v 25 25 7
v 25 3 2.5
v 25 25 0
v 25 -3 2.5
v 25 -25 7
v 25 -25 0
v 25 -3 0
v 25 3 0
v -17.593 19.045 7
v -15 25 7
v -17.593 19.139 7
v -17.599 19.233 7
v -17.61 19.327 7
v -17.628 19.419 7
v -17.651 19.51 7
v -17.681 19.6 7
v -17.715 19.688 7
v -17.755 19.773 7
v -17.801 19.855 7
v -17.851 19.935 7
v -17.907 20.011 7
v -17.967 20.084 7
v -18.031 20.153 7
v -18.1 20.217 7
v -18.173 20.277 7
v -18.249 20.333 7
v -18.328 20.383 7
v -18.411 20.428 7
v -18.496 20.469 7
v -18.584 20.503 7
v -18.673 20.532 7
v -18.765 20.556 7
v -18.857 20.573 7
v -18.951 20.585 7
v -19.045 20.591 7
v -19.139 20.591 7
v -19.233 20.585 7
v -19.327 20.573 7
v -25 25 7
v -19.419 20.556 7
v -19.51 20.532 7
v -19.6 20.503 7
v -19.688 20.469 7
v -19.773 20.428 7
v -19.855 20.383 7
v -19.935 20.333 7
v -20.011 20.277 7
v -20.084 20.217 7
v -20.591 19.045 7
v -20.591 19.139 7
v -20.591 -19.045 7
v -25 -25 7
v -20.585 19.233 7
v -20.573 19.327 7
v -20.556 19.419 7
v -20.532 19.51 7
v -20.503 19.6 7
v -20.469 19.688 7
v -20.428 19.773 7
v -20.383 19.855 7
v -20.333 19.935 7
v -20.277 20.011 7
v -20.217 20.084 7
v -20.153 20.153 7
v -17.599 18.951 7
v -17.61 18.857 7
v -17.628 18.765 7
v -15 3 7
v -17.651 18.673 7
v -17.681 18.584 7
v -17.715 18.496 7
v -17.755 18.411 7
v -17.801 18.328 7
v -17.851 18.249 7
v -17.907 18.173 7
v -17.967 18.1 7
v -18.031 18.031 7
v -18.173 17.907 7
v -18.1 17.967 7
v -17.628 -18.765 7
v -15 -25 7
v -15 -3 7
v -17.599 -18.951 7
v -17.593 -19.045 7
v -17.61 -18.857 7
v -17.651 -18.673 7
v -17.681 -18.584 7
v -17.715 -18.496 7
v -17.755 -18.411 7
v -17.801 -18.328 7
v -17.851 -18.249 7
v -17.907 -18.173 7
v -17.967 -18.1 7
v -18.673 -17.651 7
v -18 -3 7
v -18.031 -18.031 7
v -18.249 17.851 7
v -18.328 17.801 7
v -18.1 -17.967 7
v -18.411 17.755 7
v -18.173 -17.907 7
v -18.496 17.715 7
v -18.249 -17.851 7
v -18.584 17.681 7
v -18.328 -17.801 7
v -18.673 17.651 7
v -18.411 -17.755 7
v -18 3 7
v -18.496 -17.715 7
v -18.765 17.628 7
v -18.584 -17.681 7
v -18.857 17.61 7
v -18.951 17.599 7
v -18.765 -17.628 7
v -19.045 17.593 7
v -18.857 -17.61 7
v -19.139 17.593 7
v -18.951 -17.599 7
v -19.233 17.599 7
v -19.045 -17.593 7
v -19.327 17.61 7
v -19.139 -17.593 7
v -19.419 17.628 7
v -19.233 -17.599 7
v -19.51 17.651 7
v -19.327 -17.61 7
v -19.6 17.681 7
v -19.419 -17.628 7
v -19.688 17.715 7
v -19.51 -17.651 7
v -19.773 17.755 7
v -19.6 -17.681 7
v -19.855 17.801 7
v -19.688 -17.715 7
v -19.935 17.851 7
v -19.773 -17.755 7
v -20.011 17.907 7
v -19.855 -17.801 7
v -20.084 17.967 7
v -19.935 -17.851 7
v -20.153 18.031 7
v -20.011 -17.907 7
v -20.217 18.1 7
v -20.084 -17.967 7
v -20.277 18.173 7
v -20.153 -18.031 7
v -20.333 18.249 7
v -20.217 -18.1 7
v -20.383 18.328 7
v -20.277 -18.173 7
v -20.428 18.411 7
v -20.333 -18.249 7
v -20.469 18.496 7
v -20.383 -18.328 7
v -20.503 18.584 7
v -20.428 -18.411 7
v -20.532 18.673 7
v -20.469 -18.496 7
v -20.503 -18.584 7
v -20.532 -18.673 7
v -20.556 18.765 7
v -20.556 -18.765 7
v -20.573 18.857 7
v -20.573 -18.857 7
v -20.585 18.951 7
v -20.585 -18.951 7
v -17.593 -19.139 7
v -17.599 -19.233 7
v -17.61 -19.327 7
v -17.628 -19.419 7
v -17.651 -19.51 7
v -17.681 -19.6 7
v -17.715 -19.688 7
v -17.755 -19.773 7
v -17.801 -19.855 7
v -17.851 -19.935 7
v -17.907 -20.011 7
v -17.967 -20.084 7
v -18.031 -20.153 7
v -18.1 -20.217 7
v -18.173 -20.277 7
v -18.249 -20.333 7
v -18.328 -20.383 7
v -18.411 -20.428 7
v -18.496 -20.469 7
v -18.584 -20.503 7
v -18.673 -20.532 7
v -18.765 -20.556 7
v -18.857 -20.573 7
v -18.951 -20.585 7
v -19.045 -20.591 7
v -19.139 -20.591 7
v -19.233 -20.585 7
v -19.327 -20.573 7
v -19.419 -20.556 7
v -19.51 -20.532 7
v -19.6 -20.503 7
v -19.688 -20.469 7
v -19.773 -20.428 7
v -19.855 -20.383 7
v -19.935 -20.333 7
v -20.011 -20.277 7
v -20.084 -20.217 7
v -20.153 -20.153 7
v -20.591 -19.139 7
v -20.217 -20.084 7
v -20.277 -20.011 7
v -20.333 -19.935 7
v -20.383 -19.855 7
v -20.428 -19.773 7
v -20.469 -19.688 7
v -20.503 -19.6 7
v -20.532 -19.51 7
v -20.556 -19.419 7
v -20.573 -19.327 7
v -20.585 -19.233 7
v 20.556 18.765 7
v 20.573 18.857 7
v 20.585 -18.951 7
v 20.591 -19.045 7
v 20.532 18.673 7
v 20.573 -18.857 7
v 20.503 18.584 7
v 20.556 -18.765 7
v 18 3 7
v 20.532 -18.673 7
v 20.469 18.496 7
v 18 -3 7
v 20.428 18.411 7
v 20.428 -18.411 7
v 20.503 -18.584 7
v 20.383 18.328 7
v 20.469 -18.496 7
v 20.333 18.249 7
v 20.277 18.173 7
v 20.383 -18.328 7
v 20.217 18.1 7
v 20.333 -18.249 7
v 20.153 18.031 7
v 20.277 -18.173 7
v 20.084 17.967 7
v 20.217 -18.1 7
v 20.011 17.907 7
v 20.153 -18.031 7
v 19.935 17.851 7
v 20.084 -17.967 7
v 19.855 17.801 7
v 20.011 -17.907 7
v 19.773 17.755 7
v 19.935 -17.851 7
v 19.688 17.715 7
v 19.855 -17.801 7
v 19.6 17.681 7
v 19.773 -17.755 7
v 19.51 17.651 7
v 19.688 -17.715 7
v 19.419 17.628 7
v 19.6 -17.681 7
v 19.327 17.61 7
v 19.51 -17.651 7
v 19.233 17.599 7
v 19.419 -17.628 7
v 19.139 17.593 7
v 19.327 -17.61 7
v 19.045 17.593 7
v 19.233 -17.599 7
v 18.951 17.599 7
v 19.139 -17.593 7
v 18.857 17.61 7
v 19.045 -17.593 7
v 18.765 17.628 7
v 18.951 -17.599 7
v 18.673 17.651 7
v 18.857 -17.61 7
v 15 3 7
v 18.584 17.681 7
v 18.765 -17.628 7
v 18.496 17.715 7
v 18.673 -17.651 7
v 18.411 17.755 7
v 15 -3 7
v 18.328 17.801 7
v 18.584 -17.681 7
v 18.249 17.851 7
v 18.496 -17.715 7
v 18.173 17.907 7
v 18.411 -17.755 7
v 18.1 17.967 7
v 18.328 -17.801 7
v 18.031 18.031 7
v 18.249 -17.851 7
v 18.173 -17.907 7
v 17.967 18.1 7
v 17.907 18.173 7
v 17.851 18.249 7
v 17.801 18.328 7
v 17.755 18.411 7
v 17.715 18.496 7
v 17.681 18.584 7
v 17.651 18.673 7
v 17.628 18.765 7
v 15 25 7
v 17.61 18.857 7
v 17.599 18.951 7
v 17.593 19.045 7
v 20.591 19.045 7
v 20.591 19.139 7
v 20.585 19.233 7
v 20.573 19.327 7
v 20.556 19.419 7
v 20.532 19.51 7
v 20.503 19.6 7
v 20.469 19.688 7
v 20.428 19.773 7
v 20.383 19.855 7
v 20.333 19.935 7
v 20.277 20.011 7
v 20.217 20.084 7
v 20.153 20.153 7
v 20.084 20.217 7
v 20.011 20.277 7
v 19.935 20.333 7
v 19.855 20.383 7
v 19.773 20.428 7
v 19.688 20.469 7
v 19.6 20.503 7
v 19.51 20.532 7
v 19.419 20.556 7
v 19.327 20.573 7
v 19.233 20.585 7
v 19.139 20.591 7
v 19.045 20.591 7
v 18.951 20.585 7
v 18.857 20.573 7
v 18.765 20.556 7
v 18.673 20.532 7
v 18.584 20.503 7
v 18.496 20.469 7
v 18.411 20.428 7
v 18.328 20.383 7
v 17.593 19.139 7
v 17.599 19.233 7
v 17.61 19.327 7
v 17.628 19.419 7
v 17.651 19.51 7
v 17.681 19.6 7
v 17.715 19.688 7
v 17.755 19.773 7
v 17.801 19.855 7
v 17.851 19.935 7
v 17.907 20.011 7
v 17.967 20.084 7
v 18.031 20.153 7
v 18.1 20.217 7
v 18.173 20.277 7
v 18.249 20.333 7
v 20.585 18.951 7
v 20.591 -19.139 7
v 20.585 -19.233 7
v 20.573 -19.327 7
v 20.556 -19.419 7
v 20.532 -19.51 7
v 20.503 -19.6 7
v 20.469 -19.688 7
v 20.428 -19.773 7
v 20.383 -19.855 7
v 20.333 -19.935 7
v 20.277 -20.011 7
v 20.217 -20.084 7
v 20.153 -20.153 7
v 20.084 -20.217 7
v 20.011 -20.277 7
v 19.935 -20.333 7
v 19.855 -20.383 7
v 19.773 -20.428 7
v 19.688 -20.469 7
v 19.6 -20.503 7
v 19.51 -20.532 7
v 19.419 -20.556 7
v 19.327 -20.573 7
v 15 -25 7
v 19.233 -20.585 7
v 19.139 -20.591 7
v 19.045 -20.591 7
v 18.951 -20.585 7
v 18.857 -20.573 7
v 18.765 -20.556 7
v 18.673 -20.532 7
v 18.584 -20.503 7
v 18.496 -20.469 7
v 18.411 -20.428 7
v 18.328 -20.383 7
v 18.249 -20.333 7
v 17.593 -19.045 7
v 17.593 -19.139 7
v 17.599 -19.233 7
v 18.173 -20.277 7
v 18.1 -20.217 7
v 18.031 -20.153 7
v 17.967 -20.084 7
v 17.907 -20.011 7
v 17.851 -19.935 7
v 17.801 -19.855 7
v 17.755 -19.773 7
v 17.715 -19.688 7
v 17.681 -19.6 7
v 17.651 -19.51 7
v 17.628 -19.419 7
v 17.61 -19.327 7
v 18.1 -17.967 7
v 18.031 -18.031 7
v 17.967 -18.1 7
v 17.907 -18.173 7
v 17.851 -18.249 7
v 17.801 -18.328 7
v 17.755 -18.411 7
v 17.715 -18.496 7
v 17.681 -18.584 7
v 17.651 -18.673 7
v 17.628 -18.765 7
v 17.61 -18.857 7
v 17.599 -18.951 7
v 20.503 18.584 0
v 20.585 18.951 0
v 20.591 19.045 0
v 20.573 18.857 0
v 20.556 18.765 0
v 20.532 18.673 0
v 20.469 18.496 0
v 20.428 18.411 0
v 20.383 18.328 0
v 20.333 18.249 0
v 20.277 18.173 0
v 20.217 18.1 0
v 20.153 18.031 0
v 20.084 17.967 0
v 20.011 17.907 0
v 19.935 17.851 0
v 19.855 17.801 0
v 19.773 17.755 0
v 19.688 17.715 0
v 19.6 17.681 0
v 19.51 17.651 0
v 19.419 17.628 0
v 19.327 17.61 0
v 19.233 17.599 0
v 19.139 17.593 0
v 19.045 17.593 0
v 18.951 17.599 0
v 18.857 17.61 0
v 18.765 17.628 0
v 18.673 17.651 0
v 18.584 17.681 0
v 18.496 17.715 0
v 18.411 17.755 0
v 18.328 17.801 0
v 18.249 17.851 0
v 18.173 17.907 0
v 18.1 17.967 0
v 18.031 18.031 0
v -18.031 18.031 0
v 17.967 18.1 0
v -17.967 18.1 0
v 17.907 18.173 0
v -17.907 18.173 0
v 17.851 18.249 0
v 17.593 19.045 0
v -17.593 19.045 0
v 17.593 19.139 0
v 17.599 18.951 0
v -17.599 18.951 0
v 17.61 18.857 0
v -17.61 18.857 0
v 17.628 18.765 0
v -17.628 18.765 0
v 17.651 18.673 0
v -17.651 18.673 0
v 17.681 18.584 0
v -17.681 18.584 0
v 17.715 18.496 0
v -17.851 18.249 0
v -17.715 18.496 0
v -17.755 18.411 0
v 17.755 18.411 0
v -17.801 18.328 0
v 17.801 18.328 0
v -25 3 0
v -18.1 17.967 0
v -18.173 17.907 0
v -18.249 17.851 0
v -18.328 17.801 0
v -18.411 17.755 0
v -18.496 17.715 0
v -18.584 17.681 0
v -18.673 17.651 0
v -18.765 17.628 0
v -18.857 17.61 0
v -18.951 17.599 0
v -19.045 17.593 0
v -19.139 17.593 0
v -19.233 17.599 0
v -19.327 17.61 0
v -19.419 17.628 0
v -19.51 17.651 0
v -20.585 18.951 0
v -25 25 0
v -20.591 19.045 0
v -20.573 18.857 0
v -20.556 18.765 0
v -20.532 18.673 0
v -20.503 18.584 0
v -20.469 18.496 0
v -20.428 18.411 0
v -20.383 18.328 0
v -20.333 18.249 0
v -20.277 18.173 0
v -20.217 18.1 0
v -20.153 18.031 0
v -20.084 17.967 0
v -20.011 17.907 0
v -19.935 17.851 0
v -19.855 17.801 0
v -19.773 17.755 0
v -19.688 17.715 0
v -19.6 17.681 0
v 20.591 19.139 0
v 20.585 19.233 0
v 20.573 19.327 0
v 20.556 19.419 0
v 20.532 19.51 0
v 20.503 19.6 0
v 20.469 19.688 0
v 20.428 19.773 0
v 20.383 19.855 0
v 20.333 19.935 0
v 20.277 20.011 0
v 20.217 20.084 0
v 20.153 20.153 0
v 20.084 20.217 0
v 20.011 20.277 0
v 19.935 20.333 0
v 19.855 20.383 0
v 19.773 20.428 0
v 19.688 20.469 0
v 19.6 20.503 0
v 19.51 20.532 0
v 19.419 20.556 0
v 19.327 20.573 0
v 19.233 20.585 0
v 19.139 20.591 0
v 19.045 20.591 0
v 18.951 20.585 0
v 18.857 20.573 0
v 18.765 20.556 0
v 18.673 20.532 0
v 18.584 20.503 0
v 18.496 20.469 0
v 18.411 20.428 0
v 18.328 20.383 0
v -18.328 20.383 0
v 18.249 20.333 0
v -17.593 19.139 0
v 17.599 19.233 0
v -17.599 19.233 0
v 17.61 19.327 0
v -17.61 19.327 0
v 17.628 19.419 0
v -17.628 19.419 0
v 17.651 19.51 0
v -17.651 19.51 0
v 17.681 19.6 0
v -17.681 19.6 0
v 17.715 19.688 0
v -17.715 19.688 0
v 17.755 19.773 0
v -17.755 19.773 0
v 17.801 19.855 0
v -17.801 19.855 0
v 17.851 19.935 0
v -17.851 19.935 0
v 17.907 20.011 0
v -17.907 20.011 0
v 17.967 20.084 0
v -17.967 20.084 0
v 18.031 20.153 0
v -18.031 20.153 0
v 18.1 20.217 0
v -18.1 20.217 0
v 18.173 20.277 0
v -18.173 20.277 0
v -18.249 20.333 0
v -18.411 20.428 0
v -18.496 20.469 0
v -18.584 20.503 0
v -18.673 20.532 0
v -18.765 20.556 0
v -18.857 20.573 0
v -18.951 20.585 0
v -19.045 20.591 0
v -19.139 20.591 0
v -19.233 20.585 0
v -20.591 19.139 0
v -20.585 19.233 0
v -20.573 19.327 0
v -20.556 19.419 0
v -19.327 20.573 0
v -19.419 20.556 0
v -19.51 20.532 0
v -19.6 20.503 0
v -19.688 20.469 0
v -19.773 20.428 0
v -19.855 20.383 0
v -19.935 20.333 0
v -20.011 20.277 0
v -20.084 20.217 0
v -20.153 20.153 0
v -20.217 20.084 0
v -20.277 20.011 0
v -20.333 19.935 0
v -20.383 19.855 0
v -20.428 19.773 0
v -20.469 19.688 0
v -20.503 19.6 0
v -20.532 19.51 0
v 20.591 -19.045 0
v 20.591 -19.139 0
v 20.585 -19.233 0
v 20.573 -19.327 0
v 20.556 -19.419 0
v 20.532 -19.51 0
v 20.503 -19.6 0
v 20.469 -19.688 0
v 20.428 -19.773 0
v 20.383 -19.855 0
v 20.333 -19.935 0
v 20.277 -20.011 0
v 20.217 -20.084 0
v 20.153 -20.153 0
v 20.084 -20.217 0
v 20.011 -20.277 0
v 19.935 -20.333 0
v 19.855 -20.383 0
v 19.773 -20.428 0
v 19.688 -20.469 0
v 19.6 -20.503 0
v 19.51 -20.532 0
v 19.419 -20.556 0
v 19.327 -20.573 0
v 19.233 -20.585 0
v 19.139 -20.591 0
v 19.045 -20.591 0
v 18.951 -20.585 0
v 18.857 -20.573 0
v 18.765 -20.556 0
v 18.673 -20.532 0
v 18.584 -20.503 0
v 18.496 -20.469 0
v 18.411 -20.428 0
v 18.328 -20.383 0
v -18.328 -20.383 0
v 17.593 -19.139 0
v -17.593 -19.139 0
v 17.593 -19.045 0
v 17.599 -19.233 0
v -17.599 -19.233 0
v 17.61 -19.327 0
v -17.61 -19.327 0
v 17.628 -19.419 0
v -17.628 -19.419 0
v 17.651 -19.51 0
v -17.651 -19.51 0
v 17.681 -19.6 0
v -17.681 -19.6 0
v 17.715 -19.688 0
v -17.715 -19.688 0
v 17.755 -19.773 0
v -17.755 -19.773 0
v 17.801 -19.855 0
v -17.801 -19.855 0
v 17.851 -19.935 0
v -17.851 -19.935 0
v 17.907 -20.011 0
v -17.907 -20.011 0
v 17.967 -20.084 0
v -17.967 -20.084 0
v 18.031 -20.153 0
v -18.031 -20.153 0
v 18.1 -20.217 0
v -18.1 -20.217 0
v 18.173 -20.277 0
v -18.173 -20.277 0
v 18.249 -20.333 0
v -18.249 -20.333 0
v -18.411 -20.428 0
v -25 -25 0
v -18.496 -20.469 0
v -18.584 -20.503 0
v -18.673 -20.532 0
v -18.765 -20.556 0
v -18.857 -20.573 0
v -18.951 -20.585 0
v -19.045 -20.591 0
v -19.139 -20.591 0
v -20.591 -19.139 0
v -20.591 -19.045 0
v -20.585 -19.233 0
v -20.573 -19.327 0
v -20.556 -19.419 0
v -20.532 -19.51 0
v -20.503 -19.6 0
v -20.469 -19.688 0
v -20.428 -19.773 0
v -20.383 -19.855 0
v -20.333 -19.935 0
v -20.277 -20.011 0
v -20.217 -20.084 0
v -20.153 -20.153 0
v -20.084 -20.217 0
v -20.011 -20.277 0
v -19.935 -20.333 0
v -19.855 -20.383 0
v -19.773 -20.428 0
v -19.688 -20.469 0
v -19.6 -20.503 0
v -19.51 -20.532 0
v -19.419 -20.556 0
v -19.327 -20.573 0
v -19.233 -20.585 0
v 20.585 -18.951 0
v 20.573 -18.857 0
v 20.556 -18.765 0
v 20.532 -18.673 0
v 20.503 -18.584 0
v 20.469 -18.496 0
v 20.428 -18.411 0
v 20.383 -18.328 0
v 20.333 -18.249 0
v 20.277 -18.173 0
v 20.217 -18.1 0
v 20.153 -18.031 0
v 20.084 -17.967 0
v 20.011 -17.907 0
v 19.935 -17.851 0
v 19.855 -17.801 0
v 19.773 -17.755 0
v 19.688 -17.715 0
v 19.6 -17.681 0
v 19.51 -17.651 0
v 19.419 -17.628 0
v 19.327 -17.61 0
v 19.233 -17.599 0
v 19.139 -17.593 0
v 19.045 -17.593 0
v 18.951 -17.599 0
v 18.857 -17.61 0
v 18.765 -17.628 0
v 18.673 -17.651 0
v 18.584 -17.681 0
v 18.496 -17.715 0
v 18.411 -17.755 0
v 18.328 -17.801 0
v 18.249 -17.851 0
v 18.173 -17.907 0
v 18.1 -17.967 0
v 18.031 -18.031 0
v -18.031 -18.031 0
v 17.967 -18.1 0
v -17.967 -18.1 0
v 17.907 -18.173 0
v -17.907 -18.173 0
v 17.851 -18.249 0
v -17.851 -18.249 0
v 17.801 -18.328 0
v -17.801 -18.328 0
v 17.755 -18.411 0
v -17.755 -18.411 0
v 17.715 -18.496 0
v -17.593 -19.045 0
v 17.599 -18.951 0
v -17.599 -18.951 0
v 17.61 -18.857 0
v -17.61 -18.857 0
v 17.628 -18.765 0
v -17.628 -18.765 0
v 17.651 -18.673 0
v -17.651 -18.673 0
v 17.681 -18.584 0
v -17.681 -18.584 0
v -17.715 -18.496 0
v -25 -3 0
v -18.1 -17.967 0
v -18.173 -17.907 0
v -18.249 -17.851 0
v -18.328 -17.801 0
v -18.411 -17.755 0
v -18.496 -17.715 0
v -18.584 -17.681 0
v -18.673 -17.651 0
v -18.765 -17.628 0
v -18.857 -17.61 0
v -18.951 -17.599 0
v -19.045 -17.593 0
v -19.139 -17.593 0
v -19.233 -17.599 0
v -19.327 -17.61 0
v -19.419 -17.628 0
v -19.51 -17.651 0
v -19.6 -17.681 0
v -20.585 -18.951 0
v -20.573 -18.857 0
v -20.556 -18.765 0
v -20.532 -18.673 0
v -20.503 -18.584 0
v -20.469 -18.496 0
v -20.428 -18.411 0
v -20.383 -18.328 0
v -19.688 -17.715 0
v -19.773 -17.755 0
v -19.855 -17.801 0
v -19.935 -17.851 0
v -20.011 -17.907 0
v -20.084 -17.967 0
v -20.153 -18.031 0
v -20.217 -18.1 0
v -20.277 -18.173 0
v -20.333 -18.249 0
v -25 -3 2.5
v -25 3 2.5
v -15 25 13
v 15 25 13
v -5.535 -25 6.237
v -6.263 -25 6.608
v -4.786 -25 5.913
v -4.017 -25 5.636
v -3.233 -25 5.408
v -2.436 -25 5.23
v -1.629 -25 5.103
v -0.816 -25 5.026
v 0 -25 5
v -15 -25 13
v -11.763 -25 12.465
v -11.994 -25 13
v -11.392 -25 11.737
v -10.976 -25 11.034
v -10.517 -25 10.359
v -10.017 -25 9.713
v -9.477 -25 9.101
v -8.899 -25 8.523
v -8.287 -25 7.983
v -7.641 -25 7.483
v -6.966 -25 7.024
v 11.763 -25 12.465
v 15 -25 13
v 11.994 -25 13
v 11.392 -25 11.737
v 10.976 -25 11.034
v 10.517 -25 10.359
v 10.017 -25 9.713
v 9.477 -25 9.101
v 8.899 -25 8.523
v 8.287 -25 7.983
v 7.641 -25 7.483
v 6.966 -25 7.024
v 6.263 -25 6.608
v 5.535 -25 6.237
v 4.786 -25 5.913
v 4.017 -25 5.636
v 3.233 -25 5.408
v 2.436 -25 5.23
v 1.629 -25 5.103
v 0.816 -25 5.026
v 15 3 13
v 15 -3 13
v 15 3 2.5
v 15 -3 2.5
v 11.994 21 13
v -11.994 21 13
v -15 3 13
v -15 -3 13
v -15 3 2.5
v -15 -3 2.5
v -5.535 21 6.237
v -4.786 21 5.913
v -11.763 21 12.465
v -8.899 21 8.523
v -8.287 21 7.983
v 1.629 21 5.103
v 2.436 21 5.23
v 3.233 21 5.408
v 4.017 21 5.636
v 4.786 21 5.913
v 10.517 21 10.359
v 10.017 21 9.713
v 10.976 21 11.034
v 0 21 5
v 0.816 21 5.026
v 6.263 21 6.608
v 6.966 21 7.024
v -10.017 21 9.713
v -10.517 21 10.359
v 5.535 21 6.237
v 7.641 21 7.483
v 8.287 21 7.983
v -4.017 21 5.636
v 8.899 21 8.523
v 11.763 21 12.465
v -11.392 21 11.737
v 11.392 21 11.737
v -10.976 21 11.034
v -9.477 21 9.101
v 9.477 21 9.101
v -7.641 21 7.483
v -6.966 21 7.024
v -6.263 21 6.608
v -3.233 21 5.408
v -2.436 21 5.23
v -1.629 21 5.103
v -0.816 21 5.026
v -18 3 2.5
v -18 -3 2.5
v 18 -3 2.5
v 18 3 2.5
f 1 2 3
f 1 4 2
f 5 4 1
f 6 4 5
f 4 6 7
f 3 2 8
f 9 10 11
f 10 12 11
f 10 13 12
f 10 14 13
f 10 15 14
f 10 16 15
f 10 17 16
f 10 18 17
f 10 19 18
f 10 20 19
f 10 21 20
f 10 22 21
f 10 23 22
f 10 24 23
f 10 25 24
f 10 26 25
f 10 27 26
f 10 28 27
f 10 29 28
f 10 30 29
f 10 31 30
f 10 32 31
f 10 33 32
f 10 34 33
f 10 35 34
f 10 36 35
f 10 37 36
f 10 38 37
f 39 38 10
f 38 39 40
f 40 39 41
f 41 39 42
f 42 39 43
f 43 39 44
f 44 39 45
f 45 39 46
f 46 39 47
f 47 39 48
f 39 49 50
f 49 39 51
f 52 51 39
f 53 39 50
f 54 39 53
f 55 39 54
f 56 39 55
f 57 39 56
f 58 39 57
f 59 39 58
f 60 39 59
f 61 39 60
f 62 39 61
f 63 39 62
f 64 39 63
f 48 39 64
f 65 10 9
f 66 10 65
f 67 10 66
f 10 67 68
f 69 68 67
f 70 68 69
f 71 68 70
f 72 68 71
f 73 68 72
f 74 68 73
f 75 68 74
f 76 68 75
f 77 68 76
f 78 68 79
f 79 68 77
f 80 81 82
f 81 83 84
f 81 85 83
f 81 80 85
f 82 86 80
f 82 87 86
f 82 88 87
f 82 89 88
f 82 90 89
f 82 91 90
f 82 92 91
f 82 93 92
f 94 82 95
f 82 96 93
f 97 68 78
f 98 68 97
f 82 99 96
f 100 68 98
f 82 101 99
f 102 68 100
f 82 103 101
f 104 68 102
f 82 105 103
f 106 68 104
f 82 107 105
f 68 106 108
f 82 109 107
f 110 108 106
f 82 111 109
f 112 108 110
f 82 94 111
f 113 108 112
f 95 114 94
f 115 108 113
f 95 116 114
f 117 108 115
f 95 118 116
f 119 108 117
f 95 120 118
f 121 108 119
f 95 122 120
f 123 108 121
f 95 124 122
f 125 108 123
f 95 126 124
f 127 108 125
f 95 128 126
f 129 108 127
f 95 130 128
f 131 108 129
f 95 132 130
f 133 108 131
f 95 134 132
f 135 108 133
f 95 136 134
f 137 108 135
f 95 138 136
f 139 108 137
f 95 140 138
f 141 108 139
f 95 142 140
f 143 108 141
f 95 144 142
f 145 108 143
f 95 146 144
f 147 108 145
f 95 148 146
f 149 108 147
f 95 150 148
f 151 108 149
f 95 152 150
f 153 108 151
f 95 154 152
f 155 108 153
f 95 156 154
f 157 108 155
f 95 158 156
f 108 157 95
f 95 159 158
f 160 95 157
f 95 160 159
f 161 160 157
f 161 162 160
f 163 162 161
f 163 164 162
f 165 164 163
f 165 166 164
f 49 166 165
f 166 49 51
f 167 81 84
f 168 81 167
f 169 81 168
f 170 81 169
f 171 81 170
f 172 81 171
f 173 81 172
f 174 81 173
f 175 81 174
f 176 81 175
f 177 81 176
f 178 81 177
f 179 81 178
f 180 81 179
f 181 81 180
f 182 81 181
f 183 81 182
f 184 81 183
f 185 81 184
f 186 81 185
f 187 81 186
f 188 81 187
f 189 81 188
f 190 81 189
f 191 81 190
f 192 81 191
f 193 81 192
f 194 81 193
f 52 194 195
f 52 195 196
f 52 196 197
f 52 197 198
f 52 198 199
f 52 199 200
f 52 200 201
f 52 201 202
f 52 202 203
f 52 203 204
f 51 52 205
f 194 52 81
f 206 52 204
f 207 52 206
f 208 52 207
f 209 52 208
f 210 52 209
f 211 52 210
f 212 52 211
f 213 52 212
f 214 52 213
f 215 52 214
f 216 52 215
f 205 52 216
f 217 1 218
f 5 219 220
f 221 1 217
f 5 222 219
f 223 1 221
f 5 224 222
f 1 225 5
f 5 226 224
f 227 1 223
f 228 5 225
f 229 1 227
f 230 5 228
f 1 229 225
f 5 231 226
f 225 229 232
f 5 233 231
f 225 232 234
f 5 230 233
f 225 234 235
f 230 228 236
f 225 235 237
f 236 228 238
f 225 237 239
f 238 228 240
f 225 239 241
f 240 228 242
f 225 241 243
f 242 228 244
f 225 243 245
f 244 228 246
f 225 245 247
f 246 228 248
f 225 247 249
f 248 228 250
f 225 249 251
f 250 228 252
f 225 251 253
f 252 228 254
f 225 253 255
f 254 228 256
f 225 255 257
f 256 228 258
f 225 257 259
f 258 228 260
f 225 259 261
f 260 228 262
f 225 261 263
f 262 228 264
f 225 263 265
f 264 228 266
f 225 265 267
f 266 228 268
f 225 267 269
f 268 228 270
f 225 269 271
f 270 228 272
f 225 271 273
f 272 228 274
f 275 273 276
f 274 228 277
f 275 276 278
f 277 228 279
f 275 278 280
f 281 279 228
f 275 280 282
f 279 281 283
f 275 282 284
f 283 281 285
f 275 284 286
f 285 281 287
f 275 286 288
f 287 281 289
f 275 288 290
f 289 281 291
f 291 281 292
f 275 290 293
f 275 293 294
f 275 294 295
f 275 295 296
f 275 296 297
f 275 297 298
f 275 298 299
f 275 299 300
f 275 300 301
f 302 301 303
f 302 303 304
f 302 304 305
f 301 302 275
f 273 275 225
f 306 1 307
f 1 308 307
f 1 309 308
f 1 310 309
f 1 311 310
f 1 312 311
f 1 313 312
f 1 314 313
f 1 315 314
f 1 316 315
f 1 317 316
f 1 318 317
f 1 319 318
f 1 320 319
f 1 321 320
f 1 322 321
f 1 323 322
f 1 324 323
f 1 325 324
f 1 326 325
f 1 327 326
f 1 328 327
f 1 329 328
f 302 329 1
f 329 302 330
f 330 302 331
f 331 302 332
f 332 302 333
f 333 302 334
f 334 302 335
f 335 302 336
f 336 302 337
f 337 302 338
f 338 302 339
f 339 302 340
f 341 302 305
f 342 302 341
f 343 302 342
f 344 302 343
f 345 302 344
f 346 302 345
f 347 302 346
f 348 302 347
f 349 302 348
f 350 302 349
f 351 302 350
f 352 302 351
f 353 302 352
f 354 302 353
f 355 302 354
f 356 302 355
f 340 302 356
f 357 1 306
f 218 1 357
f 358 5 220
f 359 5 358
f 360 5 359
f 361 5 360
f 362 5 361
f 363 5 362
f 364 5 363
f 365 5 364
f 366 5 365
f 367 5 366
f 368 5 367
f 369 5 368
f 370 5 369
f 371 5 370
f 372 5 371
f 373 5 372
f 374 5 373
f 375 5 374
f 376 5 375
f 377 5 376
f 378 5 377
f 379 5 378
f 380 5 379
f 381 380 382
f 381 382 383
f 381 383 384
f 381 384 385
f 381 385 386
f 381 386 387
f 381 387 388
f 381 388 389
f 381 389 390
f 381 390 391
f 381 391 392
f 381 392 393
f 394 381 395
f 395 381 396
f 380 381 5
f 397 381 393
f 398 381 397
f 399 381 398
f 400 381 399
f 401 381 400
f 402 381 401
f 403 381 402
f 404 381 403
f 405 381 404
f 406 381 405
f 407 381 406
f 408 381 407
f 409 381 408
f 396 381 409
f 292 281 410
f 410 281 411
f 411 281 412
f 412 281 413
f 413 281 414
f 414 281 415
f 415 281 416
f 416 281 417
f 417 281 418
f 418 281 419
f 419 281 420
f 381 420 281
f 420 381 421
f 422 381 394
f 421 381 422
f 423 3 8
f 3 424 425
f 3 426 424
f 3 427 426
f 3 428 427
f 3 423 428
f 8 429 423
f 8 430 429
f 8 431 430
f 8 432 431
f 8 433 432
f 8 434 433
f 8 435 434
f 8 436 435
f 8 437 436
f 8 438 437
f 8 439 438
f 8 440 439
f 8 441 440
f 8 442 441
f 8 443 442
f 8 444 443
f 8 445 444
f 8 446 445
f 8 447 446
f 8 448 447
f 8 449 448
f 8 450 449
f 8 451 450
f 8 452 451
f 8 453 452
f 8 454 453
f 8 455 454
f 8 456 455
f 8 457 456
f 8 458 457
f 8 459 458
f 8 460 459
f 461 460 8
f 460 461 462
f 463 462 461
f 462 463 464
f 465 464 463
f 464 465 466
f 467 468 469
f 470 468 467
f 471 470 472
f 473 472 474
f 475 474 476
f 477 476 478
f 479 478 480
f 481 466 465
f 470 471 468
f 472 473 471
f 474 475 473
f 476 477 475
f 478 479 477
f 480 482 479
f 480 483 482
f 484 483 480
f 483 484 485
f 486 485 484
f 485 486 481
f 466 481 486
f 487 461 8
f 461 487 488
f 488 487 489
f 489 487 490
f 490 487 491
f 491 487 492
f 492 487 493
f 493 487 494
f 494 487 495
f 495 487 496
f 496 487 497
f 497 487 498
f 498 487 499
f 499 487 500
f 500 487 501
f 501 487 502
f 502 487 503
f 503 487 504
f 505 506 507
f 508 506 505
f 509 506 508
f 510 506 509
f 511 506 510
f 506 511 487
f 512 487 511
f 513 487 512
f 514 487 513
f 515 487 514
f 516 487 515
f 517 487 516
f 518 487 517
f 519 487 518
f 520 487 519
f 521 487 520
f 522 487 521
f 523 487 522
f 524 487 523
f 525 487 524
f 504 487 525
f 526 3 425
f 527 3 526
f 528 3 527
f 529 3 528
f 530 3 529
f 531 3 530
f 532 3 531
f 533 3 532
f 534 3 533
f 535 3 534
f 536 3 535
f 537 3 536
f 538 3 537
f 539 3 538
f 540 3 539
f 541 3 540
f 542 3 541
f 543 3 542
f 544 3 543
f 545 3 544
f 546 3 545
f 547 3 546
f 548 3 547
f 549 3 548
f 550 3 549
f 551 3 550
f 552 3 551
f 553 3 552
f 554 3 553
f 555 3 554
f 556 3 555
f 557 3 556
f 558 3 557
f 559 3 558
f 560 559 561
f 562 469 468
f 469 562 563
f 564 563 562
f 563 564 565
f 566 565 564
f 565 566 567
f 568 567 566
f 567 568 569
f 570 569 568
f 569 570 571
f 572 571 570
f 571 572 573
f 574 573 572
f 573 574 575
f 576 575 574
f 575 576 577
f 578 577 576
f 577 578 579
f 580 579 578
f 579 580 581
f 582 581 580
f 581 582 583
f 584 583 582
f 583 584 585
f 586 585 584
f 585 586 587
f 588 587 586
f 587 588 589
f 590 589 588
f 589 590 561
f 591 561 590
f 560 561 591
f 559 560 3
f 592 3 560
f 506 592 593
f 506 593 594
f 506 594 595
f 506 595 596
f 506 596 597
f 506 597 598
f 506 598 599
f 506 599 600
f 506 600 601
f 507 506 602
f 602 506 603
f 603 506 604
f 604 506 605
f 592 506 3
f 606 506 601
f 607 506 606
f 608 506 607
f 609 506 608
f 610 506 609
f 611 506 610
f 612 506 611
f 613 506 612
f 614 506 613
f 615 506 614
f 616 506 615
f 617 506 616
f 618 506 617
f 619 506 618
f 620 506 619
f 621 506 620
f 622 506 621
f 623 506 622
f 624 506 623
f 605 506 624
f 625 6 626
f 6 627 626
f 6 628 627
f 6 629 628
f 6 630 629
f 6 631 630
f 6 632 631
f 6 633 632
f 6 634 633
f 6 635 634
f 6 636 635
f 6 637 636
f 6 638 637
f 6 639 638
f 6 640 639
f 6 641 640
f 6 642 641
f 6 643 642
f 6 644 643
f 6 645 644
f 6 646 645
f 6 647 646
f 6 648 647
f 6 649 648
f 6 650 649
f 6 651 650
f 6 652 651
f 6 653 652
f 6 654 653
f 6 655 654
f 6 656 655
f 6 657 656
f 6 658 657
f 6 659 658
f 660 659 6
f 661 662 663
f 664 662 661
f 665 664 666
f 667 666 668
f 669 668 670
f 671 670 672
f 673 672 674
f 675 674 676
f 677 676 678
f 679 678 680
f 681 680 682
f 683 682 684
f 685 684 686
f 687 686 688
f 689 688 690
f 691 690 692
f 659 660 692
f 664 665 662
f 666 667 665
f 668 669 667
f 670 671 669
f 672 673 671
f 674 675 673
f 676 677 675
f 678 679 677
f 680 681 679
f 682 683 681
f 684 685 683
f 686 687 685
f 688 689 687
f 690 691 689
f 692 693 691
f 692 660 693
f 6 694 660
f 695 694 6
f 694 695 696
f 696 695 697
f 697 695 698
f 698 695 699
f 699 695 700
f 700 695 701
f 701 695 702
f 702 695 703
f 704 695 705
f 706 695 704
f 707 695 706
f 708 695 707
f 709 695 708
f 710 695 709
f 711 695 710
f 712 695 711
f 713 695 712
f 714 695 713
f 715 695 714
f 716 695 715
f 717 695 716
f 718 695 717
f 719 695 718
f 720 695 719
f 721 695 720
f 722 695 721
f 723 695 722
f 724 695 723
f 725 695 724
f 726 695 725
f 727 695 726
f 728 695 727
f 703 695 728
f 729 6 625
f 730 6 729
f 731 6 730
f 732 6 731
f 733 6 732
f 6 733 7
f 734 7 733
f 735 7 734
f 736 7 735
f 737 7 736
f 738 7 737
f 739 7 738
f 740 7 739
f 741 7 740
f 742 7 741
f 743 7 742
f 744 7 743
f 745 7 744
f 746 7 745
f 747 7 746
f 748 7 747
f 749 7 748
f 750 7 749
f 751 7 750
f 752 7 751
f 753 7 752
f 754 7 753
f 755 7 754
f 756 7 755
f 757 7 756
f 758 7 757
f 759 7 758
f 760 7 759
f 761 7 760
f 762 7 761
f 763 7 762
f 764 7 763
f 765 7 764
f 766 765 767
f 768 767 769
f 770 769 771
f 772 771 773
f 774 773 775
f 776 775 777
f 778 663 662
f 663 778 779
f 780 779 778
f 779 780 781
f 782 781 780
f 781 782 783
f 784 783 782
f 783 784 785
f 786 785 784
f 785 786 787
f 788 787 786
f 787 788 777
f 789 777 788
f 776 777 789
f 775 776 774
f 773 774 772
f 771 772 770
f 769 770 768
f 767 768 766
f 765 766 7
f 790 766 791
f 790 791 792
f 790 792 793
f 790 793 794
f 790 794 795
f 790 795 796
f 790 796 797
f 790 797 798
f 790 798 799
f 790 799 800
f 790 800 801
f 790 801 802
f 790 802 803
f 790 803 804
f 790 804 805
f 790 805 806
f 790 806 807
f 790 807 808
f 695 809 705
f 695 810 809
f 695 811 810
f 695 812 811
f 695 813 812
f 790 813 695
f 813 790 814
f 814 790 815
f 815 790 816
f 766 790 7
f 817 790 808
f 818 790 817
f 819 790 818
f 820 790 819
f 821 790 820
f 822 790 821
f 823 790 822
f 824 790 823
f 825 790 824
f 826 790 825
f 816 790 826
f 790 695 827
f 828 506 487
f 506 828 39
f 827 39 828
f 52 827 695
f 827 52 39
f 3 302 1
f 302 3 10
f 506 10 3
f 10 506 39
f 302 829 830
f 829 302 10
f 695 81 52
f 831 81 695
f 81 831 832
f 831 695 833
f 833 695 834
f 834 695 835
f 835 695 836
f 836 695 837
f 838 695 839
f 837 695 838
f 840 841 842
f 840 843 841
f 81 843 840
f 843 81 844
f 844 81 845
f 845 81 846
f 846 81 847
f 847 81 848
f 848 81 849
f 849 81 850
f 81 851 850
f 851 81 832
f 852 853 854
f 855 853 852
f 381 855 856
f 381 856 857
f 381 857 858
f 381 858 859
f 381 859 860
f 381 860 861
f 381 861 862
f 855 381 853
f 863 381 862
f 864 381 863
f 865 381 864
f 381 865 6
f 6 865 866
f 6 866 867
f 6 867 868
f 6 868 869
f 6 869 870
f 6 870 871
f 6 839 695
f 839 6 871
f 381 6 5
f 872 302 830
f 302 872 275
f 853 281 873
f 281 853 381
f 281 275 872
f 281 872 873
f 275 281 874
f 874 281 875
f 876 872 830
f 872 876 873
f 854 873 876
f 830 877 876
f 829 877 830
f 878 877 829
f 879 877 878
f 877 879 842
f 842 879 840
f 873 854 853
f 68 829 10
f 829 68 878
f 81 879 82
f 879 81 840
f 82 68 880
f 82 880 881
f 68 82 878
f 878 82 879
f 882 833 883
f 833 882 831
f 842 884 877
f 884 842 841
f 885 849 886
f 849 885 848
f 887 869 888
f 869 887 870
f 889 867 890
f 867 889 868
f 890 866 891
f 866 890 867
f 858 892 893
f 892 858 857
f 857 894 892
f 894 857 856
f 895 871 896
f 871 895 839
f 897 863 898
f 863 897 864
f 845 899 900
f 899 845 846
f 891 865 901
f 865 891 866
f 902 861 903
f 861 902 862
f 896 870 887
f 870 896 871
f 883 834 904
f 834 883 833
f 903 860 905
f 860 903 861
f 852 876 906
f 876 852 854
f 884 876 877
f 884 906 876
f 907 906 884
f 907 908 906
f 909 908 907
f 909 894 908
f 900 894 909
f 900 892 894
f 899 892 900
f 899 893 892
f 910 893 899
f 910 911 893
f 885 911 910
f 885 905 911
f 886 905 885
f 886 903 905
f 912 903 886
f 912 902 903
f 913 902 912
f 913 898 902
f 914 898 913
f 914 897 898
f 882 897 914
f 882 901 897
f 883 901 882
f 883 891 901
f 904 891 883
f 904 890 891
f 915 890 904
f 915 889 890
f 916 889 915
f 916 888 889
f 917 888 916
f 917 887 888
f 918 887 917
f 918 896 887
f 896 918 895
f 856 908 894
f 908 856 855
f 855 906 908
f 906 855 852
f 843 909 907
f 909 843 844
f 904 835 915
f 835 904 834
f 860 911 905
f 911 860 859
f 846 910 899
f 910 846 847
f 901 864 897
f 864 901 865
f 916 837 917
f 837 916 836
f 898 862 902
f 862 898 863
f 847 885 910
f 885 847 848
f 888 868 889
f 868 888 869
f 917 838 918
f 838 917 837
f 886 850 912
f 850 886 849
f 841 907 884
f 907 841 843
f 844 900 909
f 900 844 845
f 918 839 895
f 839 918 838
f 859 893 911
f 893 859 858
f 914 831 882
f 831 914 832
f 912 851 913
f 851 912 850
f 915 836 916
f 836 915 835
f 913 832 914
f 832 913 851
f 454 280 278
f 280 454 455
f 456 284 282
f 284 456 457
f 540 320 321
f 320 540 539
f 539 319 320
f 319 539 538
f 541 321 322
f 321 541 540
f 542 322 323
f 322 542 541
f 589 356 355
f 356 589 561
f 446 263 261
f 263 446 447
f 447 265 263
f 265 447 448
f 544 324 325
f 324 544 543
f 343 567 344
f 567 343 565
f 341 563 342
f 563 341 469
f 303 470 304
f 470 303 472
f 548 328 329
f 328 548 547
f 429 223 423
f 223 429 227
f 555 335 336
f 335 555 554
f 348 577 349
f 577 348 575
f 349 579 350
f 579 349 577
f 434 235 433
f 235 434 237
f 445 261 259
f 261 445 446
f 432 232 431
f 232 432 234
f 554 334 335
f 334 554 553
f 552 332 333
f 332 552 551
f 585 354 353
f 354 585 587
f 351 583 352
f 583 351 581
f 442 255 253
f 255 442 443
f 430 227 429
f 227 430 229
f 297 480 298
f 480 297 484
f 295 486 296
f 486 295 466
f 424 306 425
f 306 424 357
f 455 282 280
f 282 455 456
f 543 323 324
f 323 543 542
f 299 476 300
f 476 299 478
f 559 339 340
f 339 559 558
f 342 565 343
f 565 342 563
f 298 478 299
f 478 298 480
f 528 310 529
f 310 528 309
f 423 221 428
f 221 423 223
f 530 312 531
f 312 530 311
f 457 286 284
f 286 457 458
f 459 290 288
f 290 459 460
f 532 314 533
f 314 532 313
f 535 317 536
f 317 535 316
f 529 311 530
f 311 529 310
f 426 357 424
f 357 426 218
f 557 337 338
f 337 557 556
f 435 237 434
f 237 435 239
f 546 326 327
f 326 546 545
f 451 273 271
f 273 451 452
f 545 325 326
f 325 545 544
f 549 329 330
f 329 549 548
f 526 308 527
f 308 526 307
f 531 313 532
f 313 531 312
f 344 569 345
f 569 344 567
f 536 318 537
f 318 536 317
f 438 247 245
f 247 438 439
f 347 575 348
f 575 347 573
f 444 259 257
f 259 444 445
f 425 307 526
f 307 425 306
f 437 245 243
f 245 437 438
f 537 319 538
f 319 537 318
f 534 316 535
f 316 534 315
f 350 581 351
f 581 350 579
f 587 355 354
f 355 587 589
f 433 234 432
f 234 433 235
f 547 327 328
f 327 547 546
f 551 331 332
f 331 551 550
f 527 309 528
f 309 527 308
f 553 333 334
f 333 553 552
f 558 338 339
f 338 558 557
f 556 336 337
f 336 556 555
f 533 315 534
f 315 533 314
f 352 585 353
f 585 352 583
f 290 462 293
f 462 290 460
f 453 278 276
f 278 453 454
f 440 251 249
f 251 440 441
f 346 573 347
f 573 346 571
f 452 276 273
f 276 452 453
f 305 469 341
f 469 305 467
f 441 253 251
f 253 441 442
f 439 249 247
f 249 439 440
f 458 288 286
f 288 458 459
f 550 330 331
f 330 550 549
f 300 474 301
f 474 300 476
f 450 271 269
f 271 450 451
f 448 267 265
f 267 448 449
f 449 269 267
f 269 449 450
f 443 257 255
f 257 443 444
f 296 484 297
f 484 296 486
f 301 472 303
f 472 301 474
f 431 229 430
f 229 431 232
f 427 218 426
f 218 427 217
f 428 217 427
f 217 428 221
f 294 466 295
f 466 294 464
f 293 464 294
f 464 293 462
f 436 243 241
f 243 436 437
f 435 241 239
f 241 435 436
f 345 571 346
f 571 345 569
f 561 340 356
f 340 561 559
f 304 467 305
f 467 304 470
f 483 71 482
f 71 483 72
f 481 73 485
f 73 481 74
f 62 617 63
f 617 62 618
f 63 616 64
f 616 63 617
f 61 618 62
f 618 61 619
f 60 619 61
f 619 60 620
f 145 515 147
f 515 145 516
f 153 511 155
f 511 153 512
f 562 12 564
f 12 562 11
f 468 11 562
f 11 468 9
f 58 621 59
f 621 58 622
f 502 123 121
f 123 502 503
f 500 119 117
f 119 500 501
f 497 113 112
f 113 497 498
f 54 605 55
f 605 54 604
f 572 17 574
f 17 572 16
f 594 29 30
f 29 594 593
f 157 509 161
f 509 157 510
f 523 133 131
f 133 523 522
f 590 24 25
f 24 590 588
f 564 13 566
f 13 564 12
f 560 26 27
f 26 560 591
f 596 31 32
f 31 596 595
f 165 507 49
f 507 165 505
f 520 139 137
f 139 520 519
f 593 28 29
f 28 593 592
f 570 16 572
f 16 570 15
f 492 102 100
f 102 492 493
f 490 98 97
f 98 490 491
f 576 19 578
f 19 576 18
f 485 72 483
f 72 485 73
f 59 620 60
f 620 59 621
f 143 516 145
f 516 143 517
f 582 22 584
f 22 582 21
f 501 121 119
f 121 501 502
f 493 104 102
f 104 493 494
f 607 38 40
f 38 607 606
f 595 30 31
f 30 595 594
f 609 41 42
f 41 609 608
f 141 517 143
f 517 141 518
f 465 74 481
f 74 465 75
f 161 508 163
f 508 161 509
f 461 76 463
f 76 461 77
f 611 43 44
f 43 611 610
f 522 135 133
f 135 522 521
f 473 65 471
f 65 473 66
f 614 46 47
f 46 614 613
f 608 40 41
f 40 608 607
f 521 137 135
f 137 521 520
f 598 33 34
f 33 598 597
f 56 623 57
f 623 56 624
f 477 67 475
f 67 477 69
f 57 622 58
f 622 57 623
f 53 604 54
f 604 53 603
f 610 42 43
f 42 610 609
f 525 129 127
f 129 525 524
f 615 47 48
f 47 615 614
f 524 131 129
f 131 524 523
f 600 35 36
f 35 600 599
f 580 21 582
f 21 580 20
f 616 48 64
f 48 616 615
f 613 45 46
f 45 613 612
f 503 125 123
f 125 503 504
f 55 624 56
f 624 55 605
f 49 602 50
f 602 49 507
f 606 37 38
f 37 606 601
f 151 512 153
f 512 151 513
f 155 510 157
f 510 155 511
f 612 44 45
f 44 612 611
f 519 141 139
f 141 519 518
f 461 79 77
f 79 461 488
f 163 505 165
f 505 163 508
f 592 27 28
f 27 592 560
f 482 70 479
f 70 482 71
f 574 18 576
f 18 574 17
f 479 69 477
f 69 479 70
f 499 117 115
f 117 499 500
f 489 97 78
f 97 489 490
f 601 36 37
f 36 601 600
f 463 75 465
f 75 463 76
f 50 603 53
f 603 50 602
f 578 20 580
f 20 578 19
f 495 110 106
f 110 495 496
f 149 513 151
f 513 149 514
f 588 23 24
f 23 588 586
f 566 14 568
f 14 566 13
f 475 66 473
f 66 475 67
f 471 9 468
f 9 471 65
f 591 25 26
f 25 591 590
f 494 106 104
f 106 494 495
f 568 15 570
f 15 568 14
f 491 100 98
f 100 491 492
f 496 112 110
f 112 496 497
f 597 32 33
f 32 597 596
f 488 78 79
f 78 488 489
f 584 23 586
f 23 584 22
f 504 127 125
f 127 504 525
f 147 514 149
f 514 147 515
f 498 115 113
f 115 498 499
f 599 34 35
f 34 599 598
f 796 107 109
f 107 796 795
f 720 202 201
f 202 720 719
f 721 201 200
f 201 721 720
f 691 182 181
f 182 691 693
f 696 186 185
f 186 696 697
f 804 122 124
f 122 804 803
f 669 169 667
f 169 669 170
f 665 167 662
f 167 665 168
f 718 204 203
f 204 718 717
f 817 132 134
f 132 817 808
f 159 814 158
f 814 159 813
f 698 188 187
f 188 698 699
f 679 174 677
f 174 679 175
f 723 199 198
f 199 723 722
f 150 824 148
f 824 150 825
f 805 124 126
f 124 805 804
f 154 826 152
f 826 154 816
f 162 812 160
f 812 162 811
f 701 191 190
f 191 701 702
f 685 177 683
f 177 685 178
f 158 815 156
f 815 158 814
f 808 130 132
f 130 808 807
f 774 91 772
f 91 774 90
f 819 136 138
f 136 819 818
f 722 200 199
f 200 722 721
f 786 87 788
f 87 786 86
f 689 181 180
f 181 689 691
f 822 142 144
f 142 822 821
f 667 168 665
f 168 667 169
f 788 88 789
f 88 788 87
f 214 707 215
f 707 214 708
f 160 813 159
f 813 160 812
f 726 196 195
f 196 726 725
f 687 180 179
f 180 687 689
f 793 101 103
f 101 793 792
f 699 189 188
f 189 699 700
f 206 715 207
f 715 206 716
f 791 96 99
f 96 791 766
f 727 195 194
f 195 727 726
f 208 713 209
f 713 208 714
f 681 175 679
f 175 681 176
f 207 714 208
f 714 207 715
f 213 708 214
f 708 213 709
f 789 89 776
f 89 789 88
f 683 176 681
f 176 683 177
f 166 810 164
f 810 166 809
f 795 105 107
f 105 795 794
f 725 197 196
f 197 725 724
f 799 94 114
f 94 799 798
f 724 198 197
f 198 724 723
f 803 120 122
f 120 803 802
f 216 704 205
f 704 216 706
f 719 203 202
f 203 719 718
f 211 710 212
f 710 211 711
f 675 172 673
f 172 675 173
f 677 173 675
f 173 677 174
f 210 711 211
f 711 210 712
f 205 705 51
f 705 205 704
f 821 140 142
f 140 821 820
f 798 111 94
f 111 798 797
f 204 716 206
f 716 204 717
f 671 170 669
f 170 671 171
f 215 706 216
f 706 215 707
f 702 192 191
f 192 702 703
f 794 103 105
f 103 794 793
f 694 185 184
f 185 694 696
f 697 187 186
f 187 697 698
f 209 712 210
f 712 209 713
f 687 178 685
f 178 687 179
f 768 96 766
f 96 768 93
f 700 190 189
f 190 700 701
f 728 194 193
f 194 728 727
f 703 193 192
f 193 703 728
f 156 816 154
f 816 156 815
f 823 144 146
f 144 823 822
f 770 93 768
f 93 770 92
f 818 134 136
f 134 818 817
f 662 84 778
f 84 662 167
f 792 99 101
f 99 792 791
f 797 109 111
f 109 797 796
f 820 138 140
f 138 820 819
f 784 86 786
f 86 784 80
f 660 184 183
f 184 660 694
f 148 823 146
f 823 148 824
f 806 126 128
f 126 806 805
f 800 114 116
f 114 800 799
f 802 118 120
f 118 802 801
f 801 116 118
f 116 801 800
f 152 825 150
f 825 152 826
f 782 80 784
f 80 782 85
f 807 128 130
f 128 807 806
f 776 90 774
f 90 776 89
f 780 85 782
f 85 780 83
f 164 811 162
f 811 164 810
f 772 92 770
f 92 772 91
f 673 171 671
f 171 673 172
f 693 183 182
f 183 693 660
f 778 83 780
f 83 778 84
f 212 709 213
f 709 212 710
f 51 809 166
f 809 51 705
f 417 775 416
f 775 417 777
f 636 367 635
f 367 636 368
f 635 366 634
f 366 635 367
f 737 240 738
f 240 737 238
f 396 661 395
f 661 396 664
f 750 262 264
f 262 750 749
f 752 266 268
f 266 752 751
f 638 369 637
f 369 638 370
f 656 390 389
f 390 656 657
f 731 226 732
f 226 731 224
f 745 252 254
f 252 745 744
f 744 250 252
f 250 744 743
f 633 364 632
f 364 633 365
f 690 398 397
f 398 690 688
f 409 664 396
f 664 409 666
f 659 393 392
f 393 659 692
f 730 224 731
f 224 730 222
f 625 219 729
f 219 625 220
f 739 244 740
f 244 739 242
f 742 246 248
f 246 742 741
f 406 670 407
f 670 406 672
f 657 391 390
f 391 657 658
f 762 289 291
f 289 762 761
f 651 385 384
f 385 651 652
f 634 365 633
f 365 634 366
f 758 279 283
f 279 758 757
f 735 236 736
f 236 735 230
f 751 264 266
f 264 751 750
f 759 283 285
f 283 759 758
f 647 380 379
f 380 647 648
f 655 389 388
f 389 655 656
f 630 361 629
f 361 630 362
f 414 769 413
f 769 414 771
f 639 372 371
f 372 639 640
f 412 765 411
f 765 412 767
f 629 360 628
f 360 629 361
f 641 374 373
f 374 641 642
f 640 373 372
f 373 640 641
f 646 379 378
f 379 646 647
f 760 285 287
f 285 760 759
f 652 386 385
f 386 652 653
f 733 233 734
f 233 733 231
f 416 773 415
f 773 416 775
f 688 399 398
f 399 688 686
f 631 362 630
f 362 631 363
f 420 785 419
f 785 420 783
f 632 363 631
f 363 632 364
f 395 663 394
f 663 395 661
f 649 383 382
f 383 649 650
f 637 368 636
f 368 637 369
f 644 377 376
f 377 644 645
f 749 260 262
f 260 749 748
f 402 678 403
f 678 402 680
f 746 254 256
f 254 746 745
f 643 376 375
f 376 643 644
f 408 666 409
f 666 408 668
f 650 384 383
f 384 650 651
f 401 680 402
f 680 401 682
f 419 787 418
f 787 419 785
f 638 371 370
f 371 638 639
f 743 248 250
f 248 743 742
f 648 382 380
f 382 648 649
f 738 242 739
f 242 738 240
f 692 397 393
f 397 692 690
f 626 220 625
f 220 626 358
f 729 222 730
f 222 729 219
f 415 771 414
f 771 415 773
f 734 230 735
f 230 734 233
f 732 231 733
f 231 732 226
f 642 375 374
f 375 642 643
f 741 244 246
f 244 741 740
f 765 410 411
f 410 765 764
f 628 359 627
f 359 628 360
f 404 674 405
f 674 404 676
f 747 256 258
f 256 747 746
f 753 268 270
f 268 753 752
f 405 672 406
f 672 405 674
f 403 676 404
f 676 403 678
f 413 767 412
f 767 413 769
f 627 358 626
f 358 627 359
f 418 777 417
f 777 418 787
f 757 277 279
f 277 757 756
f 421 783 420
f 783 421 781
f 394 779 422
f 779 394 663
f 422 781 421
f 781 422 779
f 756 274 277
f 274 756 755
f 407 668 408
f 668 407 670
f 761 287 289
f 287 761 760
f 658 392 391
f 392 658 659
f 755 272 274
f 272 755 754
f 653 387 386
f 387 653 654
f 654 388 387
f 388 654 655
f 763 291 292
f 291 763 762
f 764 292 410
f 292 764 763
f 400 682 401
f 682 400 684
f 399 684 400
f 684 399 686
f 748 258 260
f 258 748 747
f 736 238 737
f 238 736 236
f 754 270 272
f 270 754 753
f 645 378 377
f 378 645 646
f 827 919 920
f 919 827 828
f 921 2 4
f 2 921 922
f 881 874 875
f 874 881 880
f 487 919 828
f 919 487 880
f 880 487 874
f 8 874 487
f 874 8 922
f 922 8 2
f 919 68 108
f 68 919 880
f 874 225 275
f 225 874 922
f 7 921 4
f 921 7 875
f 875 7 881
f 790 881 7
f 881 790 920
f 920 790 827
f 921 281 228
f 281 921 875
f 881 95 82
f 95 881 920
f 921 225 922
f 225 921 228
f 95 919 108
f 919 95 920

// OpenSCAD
//Geophone support RTC 10Hz

//Dimensions-------------------------------------------------
//All in mm

// Geophone dimensions
hg=34;   //height
dg=26;  //diameter 

// support
bases=50;
hs=7;
w=9;
e=5;

//holes
dh=3;
th=27;

//groove
gw=6;
gd=5;
gdd=3;
//--------------------------------------------------------------
$fn=100;//resolution

module Make_body() {
difference(){
union(){
translate([0,0,hs/2]) cube([bases,bases,hs],center=true);
translate([0,0,dg/4]) cube([bases-20,bases,dg/2],center=true);
}
translate([0,-11,e+dg/2])  rotate([90,0,0]) cylinder(h=hg+30,d=dg,center=true);
}
}
module Make_holes() {
union(){
rotate([0,0,45])translate([th,0,0]) cylinder(h=3*hs,d=dh,center=true);
rotate([0,0,135])translate([th,0,0]) cylinder(h=3*hs,d=dh,center=true);
rotate([0,0,225])translate([th,0,0]) cylinder(h=3*hs,d=dh,center=true);
rotate([0,0,315])translate([th,0,0]) cylinder(h=3*hs,d=dh,center=true);
}}

module Make_groove() {
    union(){
    cube([100,gw,gd],center=true);
    //rotate([0,0,90]) cube([100,gw,gd],center=true);
}}

module Make_groove_holes(){
   union(){
    translate([(gdd+bases)/2-10,0,0])rotate([0,90,0])cube([100,gw,gdd],center=true);
    translate([-(gdd+bases)/2+10,0,0])rotate([0,90,0])cube([100,gw,gdd],center=true);
}}


/*
color( "blue", 1.0 ) {
Make_groove_holes();
}
*/

difference(){
difference(){
difference(){
Make_body();
Make_holes();
}
Make_groove();
}
Make_groove_holes();
}

/*
color( "green", 1.0 ) {
translate([0,0,e+hg/2]) cylinder(h=hg,d=dg,center=true);
}
*/
